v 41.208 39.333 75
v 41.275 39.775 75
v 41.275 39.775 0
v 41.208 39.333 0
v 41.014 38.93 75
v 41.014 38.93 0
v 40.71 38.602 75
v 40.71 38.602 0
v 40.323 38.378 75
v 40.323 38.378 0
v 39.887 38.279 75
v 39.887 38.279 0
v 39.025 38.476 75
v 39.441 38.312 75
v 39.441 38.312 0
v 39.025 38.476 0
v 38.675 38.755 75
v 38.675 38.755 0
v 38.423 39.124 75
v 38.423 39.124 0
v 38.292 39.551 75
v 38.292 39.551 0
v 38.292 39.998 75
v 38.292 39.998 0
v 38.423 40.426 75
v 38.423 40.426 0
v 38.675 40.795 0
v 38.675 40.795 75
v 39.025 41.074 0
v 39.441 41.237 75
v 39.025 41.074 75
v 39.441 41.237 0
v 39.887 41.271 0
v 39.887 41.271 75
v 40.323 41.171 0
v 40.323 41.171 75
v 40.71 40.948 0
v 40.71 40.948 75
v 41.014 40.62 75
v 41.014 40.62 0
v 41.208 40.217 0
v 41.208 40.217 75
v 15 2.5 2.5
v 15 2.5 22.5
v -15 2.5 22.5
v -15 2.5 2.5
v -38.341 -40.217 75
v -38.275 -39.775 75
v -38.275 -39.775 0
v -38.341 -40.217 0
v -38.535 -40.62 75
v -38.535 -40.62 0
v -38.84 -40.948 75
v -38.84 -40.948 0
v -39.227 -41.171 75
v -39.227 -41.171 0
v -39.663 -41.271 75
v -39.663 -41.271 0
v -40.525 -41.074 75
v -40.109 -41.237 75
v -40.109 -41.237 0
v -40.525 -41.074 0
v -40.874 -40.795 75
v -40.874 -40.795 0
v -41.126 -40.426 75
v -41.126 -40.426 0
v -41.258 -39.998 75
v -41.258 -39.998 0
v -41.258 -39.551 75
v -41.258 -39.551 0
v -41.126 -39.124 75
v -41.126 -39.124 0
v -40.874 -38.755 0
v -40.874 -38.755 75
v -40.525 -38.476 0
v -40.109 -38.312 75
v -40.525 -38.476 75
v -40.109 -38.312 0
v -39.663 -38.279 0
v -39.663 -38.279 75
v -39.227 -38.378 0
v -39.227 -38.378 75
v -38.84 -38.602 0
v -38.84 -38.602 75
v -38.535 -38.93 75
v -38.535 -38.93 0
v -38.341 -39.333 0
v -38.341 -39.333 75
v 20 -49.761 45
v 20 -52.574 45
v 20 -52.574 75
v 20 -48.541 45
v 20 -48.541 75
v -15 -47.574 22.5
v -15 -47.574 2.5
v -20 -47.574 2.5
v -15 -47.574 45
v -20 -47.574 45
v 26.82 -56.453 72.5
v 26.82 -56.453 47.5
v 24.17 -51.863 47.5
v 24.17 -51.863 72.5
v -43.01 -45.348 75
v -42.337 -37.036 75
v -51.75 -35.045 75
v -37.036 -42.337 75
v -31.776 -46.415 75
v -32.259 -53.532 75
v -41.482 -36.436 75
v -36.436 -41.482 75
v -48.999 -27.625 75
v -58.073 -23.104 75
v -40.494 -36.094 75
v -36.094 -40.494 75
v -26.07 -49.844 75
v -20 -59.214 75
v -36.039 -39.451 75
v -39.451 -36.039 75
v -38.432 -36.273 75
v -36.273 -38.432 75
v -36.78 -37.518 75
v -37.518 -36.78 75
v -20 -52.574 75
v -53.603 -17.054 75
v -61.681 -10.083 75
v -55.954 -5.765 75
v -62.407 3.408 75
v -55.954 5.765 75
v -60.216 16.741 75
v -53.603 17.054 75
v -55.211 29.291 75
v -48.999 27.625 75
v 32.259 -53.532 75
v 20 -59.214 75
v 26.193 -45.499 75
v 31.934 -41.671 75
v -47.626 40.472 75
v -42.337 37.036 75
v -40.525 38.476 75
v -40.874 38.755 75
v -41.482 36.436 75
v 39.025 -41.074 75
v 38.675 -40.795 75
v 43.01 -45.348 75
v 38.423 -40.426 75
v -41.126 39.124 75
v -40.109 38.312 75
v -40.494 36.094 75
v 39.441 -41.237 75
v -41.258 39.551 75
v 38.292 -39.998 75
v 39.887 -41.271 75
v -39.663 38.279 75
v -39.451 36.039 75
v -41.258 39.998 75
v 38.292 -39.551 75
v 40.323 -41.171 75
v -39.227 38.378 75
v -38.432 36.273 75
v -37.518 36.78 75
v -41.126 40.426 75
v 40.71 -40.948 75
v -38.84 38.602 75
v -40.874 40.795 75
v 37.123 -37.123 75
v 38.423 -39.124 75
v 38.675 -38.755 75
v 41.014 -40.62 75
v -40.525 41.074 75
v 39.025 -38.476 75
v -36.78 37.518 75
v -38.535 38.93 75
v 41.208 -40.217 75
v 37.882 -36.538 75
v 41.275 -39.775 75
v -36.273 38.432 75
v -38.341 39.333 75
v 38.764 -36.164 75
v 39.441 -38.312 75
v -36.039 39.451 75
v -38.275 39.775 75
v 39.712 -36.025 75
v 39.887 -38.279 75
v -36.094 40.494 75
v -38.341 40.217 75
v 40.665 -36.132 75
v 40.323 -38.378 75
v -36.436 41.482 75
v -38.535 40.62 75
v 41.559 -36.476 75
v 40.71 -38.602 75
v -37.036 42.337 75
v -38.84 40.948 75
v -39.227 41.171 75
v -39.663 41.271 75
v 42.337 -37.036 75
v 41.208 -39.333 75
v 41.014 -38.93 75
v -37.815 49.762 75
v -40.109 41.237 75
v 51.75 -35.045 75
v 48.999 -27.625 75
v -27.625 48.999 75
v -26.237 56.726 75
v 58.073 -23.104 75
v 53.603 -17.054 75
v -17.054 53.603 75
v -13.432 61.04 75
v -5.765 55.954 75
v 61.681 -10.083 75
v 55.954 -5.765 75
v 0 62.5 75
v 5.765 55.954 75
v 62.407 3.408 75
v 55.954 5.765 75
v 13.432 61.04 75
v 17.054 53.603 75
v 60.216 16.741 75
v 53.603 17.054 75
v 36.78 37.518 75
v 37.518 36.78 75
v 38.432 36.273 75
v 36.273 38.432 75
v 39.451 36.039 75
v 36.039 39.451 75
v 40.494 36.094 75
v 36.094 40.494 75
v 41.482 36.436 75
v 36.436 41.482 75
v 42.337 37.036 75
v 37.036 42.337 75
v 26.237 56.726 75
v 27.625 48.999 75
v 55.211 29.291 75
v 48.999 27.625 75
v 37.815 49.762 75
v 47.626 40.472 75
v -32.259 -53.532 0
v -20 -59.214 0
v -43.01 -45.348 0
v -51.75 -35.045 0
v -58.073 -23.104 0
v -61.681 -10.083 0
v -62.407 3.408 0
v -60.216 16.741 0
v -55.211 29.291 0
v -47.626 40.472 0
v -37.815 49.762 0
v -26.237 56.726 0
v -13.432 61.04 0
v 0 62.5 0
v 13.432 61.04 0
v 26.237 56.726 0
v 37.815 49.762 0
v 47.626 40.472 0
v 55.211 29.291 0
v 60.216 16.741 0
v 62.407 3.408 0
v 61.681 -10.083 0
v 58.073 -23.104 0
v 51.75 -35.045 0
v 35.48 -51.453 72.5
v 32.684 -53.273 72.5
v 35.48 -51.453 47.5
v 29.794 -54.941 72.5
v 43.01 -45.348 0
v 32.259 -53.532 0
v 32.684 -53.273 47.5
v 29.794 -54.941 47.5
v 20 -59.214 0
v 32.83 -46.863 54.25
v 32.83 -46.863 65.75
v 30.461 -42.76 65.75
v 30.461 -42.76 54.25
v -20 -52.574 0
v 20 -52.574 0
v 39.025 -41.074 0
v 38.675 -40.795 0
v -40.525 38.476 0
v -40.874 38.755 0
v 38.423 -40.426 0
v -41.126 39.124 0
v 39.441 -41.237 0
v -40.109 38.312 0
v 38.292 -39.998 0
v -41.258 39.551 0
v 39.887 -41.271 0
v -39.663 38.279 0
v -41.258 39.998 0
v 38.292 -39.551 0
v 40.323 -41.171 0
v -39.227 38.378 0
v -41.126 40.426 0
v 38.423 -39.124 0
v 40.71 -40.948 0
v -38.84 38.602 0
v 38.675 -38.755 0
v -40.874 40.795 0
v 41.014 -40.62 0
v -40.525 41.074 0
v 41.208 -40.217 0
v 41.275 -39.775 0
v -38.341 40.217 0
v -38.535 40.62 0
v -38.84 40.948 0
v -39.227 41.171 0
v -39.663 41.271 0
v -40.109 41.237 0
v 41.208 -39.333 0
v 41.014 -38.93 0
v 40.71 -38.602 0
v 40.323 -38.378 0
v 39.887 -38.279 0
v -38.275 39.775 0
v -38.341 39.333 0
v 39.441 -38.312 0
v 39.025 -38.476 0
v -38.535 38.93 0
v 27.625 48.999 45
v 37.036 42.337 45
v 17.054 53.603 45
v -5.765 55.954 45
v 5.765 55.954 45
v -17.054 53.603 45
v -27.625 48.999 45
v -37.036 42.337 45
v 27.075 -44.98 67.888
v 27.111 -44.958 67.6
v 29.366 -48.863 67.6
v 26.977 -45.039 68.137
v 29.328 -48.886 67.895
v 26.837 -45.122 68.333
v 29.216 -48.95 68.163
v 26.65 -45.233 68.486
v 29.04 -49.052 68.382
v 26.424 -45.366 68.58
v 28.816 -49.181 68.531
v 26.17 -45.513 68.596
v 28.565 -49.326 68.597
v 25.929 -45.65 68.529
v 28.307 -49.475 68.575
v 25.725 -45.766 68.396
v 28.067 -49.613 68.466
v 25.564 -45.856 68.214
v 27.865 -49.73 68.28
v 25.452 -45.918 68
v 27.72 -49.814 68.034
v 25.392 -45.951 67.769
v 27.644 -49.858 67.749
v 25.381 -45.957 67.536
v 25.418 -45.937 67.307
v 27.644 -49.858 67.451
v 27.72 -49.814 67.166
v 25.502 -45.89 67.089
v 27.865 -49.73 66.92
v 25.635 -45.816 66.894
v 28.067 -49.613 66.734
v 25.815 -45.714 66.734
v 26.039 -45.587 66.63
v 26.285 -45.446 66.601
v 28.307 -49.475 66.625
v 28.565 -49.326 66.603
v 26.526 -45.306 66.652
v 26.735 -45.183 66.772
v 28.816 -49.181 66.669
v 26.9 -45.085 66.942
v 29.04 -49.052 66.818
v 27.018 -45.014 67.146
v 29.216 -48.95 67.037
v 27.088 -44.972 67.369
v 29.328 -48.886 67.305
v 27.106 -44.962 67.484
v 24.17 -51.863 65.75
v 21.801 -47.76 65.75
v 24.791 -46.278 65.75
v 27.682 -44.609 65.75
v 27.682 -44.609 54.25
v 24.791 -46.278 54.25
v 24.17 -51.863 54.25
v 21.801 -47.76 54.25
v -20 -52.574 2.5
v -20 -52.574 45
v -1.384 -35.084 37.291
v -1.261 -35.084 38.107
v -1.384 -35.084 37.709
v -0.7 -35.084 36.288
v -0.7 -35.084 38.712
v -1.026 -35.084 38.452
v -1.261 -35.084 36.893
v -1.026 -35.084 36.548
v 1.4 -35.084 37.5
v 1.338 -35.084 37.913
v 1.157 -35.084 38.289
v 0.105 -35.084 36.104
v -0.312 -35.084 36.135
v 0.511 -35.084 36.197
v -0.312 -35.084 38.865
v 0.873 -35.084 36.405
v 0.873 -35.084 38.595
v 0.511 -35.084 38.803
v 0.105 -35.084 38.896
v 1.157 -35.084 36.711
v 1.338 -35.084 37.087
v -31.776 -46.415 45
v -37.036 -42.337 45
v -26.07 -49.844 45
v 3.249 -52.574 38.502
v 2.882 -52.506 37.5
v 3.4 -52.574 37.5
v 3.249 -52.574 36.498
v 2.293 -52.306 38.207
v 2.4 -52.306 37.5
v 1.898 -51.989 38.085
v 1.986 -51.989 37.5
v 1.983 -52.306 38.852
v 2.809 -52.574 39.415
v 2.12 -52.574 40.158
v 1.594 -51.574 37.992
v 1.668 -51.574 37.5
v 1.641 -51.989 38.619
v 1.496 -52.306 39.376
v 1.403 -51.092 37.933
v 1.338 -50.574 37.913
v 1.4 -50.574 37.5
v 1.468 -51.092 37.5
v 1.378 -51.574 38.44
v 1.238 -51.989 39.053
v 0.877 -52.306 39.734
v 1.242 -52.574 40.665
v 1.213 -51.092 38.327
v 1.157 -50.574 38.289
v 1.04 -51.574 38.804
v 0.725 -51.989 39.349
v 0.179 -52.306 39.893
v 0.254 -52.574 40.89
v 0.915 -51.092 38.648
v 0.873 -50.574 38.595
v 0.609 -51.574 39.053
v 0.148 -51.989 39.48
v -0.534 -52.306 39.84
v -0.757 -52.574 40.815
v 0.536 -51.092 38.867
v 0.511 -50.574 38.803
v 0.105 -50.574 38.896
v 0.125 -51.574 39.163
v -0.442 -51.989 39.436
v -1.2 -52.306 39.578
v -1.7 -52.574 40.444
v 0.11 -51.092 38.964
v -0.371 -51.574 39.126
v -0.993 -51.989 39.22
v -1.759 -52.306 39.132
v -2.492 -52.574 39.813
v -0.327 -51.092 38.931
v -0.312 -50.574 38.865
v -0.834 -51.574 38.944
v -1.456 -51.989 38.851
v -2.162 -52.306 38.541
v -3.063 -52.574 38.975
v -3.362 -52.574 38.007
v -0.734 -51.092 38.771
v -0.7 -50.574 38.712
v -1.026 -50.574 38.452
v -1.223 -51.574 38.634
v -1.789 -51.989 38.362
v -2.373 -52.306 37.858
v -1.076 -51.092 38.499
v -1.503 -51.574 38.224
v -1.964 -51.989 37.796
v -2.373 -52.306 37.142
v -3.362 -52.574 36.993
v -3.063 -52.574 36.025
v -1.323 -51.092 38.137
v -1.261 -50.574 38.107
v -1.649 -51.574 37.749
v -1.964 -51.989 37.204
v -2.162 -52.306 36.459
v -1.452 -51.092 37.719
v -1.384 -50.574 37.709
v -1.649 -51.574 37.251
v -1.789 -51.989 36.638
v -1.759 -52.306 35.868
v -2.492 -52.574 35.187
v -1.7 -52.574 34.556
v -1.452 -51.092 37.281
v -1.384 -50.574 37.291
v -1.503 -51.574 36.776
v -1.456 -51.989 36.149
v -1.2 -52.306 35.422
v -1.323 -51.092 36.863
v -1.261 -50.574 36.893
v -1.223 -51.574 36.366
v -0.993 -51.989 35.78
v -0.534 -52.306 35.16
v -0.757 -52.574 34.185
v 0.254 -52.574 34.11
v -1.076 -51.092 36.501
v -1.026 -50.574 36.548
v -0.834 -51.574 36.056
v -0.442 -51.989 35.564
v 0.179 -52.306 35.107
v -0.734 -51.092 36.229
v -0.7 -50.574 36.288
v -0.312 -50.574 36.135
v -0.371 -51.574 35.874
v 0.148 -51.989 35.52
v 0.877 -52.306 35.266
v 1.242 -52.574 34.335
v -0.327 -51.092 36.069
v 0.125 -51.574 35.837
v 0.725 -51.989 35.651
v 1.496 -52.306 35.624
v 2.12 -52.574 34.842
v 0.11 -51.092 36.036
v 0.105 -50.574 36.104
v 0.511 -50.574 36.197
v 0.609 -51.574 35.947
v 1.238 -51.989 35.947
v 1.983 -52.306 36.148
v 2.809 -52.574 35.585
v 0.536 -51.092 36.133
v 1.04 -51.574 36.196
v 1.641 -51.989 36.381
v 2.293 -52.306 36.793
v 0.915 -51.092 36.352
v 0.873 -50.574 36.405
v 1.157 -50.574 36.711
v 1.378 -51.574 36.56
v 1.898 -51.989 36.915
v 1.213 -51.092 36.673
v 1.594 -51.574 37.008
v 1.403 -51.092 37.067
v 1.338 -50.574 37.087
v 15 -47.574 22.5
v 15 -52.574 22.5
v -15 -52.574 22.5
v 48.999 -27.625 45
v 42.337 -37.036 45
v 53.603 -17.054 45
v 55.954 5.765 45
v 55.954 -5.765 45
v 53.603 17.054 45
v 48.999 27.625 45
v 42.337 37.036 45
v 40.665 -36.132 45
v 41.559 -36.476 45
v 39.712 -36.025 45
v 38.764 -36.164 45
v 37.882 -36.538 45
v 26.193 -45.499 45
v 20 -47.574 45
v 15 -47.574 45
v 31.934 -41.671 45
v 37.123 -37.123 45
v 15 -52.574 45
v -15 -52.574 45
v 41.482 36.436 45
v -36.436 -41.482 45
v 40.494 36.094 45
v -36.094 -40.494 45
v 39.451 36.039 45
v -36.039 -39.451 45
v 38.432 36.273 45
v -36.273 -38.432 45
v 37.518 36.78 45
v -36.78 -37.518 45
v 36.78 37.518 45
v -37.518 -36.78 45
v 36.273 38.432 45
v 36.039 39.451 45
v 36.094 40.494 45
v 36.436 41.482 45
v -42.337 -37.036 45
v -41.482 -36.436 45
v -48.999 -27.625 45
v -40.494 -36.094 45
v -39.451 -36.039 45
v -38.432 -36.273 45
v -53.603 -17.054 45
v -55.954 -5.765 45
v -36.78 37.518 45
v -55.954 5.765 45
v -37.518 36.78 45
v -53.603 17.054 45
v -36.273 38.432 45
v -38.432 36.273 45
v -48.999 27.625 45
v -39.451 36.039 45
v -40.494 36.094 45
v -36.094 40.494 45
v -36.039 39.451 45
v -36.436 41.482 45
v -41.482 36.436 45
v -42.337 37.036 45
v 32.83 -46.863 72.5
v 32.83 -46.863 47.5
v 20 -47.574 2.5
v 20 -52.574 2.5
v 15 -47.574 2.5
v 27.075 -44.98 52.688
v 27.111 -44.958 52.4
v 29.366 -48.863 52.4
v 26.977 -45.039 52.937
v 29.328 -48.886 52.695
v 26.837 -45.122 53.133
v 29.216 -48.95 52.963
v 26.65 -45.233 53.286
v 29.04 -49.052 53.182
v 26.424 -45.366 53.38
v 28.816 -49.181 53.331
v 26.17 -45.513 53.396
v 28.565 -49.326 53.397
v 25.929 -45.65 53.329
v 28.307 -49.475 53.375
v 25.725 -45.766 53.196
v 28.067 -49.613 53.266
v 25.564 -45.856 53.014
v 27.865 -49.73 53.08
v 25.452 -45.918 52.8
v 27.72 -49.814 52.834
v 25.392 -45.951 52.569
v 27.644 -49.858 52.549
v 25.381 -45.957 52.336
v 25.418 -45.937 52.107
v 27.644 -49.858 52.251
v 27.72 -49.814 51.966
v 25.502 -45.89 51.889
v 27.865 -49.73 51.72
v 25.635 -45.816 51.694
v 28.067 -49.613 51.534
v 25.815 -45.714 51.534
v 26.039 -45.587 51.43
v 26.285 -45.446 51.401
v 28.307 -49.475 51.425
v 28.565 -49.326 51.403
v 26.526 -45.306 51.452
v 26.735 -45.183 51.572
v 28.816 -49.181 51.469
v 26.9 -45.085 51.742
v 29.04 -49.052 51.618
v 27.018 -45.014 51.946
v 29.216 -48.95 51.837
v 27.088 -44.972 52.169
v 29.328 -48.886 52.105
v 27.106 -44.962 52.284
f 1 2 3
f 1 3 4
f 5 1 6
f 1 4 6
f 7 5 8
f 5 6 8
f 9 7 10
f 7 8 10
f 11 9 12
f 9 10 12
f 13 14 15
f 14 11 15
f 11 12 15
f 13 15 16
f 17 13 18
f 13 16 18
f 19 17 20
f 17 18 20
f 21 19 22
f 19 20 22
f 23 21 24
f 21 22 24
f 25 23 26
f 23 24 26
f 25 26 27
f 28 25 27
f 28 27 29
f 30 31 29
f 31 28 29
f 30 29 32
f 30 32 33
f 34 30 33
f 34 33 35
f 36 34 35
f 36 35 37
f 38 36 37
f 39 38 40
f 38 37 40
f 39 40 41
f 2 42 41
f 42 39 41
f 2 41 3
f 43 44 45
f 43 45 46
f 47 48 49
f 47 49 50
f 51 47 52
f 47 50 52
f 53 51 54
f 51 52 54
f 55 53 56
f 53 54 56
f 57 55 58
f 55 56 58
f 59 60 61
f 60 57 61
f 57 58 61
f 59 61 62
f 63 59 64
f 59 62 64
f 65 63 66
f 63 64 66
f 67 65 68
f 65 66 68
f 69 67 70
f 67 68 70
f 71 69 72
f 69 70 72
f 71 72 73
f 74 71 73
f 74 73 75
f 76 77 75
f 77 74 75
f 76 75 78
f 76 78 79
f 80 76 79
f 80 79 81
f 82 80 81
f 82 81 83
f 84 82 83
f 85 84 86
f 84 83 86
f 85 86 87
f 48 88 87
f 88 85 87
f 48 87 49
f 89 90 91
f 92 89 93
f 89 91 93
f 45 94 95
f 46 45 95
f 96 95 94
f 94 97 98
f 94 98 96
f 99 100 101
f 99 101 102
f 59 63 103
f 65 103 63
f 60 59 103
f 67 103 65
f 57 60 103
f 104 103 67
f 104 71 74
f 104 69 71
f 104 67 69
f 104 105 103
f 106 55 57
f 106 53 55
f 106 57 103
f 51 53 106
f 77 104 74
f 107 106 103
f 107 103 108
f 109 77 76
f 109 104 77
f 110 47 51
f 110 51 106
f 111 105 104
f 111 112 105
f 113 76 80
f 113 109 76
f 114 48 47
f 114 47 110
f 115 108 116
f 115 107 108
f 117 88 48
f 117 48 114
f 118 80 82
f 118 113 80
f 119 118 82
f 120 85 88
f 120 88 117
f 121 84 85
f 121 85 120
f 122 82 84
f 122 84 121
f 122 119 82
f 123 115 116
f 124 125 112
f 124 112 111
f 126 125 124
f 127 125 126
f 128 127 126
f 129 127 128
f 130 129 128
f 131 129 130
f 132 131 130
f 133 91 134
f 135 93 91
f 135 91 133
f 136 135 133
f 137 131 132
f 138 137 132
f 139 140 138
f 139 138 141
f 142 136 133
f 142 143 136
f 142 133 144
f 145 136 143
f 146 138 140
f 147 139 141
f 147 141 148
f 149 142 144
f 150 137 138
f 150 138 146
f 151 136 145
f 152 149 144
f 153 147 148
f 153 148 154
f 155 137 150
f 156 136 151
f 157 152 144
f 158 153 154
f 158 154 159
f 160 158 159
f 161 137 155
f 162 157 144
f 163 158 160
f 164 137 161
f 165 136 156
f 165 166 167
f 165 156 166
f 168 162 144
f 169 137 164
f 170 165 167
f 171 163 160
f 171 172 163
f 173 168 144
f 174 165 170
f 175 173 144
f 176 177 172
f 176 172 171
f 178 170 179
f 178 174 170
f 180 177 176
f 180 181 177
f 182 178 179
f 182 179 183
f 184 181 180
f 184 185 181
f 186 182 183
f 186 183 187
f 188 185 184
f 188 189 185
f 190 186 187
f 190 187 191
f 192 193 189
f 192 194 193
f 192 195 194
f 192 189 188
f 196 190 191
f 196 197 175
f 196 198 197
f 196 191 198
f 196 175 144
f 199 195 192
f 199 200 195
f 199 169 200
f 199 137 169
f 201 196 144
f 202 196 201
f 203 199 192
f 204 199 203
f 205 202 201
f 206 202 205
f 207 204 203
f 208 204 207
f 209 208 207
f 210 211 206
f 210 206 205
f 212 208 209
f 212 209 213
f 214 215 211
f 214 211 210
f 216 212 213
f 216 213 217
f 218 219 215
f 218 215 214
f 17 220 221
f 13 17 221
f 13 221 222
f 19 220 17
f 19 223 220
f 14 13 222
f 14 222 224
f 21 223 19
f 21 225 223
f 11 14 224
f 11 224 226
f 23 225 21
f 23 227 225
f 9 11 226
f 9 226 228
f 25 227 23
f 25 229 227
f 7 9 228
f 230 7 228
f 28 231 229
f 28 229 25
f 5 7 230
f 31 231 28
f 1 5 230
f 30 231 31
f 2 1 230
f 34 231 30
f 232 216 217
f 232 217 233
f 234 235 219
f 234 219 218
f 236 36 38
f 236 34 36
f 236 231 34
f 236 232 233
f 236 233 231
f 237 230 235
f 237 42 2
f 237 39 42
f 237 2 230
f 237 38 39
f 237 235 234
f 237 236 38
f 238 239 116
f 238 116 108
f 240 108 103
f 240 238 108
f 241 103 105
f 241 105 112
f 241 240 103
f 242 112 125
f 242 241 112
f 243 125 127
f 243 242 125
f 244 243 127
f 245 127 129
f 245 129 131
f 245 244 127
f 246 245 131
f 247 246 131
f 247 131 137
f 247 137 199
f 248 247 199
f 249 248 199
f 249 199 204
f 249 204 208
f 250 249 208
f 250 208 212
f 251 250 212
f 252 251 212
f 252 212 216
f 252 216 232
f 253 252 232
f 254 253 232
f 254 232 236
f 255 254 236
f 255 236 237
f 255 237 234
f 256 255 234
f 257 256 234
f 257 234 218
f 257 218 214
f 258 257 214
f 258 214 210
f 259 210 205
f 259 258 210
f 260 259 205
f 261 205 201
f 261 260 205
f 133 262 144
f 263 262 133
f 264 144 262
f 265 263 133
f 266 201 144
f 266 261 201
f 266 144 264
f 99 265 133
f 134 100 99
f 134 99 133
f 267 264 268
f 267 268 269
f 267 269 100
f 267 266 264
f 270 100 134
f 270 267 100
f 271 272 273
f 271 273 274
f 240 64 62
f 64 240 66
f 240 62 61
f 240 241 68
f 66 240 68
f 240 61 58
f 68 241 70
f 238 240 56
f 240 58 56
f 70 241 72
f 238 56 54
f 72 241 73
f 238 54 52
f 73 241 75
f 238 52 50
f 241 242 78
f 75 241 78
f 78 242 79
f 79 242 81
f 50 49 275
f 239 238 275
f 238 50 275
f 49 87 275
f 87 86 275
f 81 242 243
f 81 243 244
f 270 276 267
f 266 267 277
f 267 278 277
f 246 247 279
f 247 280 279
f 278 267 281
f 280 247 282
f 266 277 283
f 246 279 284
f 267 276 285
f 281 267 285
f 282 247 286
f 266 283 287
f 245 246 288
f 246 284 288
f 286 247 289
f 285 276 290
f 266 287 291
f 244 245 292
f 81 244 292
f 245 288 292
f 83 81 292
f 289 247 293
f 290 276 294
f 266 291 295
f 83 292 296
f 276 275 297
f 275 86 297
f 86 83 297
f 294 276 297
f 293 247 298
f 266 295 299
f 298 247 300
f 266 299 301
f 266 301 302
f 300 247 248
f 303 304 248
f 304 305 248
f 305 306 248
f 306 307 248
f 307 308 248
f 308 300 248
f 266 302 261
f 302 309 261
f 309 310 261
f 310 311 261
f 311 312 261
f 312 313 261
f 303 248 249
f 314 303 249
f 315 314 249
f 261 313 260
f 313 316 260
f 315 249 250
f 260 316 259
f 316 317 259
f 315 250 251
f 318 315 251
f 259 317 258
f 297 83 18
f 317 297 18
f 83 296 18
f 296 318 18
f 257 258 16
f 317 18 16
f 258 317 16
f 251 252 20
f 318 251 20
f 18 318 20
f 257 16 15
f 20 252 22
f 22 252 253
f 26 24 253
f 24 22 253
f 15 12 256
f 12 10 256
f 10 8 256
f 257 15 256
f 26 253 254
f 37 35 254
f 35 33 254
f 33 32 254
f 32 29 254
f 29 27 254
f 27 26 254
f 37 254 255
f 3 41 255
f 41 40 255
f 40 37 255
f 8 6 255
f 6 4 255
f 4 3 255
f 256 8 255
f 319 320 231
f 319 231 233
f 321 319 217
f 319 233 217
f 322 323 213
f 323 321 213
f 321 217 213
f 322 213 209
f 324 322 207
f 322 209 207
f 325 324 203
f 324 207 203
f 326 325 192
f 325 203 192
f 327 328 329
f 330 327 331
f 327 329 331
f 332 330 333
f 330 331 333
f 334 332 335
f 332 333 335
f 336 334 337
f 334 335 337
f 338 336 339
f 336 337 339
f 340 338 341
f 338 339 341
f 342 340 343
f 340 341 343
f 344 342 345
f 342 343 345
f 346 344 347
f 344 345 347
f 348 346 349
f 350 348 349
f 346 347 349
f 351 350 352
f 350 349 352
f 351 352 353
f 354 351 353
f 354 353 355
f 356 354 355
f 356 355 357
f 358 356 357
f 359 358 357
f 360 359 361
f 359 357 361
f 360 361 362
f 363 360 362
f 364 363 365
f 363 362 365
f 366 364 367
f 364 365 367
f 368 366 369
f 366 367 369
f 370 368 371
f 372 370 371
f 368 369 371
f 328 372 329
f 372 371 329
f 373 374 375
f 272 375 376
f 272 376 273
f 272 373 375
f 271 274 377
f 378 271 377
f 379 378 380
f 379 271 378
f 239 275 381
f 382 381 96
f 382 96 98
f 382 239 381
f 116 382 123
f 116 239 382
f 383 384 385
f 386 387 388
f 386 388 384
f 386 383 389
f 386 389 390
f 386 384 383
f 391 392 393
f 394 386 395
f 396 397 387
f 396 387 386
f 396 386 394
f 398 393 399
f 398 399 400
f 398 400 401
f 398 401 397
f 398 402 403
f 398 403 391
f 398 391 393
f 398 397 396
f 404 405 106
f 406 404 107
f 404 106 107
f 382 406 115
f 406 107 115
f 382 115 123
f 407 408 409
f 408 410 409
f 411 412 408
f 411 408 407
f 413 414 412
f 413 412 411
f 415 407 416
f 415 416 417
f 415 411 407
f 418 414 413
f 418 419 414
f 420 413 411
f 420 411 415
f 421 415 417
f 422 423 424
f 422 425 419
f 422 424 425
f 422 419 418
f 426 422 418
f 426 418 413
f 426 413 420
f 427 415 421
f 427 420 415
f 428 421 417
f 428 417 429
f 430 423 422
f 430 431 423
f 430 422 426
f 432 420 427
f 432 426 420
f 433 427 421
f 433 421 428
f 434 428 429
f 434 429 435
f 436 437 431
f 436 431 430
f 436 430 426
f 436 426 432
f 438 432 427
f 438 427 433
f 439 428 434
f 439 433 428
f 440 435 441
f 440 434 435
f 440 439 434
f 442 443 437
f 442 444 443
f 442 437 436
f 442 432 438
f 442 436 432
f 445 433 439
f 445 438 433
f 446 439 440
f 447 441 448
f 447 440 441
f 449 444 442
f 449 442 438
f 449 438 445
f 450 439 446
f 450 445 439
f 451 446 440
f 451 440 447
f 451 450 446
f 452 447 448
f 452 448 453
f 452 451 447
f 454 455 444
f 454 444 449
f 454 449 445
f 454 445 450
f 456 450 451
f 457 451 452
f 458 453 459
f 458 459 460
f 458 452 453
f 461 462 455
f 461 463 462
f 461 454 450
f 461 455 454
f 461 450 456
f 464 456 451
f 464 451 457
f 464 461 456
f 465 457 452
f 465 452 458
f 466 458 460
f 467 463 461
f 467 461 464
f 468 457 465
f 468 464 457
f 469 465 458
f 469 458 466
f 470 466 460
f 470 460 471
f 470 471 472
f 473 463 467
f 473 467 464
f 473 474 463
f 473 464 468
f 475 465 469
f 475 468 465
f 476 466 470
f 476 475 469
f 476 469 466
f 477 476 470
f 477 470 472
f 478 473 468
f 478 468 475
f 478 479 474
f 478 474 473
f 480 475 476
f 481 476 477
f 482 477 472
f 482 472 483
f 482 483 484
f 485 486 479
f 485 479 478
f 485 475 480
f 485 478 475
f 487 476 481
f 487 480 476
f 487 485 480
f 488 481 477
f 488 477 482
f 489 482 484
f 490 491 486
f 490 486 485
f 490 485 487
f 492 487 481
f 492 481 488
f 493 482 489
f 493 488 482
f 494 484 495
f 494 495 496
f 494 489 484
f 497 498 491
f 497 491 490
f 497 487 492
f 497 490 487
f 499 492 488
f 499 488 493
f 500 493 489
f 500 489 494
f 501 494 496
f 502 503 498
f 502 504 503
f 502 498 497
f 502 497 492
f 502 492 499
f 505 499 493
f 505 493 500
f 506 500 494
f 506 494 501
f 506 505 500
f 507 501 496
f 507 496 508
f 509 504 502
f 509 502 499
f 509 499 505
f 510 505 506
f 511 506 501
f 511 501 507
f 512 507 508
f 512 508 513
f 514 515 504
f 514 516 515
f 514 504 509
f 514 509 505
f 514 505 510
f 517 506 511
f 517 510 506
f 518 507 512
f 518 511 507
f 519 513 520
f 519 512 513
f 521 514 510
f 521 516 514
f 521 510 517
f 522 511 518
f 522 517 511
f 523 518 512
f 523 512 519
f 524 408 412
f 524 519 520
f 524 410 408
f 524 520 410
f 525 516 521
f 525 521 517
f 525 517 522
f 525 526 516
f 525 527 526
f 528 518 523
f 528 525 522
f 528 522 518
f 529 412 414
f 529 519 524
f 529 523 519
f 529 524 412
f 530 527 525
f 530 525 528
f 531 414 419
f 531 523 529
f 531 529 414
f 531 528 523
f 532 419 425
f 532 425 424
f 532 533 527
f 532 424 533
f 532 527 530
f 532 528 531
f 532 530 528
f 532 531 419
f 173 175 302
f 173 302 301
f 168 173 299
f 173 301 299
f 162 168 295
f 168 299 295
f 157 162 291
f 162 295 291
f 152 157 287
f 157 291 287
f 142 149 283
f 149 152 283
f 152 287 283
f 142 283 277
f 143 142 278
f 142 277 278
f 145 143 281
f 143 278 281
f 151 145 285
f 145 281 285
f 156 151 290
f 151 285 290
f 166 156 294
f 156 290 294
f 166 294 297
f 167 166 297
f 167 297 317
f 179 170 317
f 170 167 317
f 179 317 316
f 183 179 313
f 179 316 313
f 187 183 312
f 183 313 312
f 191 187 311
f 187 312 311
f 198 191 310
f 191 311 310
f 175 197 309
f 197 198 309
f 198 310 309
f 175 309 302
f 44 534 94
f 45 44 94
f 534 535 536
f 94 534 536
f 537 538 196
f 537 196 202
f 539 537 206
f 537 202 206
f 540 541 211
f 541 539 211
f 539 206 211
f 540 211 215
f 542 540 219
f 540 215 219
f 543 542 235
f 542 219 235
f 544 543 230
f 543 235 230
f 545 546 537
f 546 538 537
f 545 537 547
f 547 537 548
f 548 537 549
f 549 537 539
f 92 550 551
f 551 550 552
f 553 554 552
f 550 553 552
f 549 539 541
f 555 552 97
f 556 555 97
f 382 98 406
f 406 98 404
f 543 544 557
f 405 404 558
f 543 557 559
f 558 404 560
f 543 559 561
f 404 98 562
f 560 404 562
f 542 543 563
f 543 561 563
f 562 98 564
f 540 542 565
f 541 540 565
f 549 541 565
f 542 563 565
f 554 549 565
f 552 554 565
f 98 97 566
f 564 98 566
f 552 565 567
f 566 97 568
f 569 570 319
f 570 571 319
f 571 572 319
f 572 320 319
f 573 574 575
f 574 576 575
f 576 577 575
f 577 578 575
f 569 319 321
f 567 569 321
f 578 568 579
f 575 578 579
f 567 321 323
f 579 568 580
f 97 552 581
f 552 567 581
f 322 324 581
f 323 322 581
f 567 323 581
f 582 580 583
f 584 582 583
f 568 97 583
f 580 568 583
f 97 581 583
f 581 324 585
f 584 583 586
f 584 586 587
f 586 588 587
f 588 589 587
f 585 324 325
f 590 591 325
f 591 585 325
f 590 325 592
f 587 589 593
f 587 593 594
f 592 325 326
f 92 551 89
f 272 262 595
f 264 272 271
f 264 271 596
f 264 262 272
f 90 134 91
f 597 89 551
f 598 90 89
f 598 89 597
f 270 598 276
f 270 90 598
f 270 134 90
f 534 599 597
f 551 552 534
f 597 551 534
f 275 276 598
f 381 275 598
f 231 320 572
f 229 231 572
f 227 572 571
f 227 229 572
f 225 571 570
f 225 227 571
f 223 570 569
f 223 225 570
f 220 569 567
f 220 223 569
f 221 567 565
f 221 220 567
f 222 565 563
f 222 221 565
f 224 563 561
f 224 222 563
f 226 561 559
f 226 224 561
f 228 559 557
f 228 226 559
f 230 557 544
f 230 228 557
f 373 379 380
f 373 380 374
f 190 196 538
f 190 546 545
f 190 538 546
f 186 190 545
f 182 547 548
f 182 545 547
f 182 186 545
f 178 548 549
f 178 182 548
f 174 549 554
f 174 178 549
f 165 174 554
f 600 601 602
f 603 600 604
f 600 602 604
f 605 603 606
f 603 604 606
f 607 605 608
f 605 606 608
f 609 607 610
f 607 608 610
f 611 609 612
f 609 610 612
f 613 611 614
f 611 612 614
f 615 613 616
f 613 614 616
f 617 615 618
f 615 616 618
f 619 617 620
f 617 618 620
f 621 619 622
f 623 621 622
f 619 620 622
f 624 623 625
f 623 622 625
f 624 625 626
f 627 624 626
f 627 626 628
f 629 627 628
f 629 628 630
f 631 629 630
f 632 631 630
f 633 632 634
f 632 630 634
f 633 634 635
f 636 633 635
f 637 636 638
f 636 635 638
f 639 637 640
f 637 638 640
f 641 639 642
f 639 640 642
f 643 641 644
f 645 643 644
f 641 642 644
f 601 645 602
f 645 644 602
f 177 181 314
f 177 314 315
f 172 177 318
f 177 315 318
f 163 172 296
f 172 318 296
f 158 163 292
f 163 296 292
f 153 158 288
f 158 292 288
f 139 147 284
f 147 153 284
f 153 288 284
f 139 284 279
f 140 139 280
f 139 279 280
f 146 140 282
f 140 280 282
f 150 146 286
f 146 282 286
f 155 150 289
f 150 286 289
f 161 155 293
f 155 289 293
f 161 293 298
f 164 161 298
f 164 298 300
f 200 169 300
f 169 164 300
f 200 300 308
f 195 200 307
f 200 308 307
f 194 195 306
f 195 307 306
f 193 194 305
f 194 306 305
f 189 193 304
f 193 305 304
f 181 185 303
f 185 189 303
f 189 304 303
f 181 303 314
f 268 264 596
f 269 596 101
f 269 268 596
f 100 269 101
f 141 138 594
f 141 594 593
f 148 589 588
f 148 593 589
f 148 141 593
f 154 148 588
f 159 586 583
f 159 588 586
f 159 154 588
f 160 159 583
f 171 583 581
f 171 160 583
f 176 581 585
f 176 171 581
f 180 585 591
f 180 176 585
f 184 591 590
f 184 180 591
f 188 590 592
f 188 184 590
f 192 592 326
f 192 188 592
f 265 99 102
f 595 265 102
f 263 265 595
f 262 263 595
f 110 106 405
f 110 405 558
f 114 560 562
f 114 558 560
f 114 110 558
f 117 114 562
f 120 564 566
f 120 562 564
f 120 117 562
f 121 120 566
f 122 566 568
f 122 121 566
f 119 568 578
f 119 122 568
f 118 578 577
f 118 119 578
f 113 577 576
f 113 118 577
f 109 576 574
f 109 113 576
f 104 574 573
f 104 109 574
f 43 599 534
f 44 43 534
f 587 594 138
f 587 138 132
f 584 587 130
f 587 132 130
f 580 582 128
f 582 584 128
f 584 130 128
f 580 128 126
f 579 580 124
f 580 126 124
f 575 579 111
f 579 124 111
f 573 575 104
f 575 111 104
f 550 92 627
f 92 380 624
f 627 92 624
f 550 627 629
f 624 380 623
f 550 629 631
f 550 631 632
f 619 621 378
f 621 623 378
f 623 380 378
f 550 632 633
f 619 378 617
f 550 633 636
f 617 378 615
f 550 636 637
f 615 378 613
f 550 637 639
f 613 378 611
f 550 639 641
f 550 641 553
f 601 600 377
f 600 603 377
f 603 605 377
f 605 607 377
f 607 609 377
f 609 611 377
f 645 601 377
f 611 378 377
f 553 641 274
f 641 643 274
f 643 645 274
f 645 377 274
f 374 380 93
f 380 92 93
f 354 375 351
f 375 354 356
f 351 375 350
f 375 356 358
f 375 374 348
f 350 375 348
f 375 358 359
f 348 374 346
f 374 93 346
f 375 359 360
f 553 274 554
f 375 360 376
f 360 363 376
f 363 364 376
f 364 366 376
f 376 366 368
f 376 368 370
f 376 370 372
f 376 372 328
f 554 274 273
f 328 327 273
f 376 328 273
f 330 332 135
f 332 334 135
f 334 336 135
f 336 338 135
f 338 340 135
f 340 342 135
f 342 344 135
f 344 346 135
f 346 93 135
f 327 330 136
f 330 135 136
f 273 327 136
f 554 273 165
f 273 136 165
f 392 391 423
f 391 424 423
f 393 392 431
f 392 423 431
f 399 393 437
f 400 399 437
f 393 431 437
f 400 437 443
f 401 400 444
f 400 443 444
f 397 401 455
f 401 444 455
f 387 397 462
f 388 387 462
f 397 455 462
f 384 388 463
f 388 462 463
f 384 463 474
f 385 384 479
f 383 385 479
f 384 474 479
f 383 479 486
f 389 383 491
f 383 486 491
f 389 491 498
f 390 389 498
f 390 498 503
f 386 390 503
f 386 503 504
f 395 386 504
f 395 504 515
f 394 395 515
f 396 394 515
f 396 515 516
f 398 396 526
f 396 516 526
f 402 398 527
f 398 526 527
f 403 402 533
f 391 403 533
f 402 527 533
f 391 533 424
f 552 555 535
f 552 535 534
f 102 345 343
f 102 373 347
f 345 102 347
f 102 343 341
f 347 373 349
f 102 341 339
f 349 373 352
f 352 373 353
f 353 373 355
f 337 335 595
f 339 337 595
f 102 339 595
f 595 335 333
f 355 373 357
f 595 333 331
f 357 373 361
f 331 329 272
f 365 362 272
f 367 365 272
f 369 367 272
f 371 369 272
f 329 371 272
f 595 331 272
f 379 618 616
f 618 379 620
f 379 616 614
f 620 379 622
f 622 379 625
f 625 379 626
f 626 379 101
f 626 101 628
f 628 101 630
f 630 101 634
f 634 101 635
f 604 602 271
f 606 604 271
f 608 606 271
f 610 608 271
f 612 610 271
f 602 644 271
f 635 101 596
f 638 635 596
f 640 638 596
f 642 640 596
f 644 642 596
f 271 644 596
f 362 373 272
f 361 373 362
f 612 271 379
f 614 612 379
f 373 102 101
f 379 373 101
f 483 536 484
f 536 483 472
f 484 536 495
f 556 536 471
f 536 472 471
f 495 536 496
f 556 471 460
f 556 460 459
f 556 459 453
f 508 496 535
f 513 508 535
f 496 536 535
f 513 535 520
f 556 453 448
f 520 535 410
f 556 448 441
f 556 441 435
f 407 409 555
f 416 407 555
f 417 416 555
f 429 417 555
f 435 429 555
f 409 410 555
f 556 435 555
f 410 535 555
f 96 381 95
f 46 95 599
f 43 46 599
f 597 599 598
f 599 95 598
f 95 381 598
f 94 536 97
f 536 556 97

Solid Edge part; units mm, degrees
sketch "Sketch1" plane through (0, 0, 0) normal (0, 0, 1) x (1, 0, 0)
  circle A0 centre (0, 0) radius 62.5
  circle A1 centre (-39.7748, -39.7748) radius 1.5
  circle A2 centre (39.7748, -39.7748) radius 1.5
  circle A3 centre (39.7748, 39.7748) radius 1.5
  circle A4 centre (-39.7748, 39.7748) radius 1.5
  dimension "D1" = 125
  dimension "D2" = 112.5
extrude "Protrusion1" add sketch "Sketch1" along normal blind 75
sketch "Sketch2" plane through (0, 0, 75) normal (0, 0, 1) x (1, 0, 0)
  arc A0 (-37.0362, 42.3365) -> (37.0362, 42.3365) centre (0, 0) cw
  arc A1 (42.3365, 37.0362) -> (42.3365, -37.0362) centre (0, 0) cw
  arc A2 (37.0362, -42.3365) -> (-37.0362, -42.3365) centre (0, 0) cw
  arc A3 (-42.3365, -37.0362) -> (-42.3365, 37.0362) centre (0, 0) cw
  arc A4 (-37.0362, 42.3365) -> (-42.3365, 37.0362) centre (-39.7748, 39.7748) cw
  arc A5 (42.3365, 37.0362) -> (37.0362, 42.3365) centre (39.7748, 39.7748) cw
  arc A6 (37.0362, -42.3365) -> (42.3365, -37.0362) centre (39.7748, -39.7748) cw
  arc A7 (-42.3365, -37.0362) -> (-37.0362, -42.3365) centre (-39.7748, -39.7748) cw
extrude "ExtrudedCutout_1" cut sketch "Sketch2" against normal blind 30
sketch "Sketch3" plane through (0, -62.5, 37.5) normal (0, -1, 0) x (0, 0, -1)
  line L0 (15, 15) -> (15, -15)
  line L1 (15, -15) -> (35, -15)
  line L2 (35, -15) -> (35, 15)
  line L3 (35, 15) -> (15, 15)
extrude "ExtrudedCutout_2" cut sketch "Sketch3" against normal blind 65
sketch "Sketch4" plane through (0, 0, 45) normal (0, 0, 1) x (1, 0, 0)
  line L0 (-20, -52.5744) -> (-15, -52.5744)
  line L1 (-15, -52.5744) -> (-15, -47.5744)
  line L2 (-15, -47.5744) -> (-20, -47.5744)
  line L3 (-20, -47.5744) -> (-20, -52.5744)
  line L4 (20, -52.5744) -> (15, -52.5744)
  line L5 (15, -52.5744) -> (15, -47.5744)
  line L6 (15, -47.5744) -> (20, -47.5744)
  line L7 (20, -47.5744) -> (20, -52.5744)
  dimension "D1" = 5
extrude "Cutout1" cut sketch "Sketch4" against normal up to vertex (42.5 mm away)
sketch "Sketch5" plane through (0, -62.5, 37.5) normal (0, -1, 0) x (0, 0, -1)
  line L0 (-37.5, 20) -> (37.5, 20)
  line L1 (37.5, 20) -> (37.5, -20)
  line L2 (37.5, -20) -> (-37.5, -20)
  line L3 (-37.5, -20) -> (-37.5, 20)
extrude "Cutout2" cut sketch "Sketch5" against normal up to vertex (9.9256 mm away)
sketch "Sketch6" plane through (0, -52.5744, 33.75) normal (0, -1, 0) x (1, 0, 0)
  circle A0 centre (0, 3.75) radius 1.4
extrude "ExtrudedCutout_5" cut sketch "Sketch6" against normal blind 17.4909
fillet "Round_1" radius 2 1 edges at (-1.4, -52.5744, 37.5)
sketch "Sketch7" plane through (0, 1.6432, 75) normal (0, 0, 1) x (0, 1, 0)
  arc A0 (-38.7663, -37.1231) -> (-50.1844, -20) centre (-1.6432, 0) cw
  line L0 (-54.2176, -20) -> (-50.1844, -20)
  arc A1 (-43.9797, -37.0362) -> (-54.2176, -20) centre (-1.6432, 0) cw
  line L1 (-43.9797, -37.0362) -> (-38.7663, -37.1231)
extrude "Protrusion2" add sketch "Sketch7" against normal up to vertex (30 mm away)
sketch "Sketch8" plane through (31.25, -54.1266, 37.5) normal (0.5, -0.866, 0) x (0, 0, -1)
  line L0 (-10, -5) -> (-35, -5)
  line L1 (-35, -5) -> (-35, 5)
  line L2 (-35, 5) -> (-10, 5)
  line L3 (-10, 5) -> (-10, -5)
extrude "ExtrudedCutout_7" cut sketch "Sketch8" against normal blind 5.5
sketch "Sketch9" plane through (28.5, -49.3634, 60) normal (0.5, -0.866, 0) x (0.866, 0.5, 0)
  line L0 (-5, 5.75) -> (5, 5.75)
  line L1 (5, 5.75) -> (5, -5.75)
  line L2 (5, -5.75) -> (-5, -5.75)
  line L3 (-5, -5.75) -> (-5, 5.75)
  circle A0 centre (0, 7.6) radius 1
  circle A1 centre (0, -7.6) radius 1
  dimension "D1" = 15.2
  dimension "D2" = 11.5
extrude "Cutout3" cut sketch "Sketch9" against normal up to next
